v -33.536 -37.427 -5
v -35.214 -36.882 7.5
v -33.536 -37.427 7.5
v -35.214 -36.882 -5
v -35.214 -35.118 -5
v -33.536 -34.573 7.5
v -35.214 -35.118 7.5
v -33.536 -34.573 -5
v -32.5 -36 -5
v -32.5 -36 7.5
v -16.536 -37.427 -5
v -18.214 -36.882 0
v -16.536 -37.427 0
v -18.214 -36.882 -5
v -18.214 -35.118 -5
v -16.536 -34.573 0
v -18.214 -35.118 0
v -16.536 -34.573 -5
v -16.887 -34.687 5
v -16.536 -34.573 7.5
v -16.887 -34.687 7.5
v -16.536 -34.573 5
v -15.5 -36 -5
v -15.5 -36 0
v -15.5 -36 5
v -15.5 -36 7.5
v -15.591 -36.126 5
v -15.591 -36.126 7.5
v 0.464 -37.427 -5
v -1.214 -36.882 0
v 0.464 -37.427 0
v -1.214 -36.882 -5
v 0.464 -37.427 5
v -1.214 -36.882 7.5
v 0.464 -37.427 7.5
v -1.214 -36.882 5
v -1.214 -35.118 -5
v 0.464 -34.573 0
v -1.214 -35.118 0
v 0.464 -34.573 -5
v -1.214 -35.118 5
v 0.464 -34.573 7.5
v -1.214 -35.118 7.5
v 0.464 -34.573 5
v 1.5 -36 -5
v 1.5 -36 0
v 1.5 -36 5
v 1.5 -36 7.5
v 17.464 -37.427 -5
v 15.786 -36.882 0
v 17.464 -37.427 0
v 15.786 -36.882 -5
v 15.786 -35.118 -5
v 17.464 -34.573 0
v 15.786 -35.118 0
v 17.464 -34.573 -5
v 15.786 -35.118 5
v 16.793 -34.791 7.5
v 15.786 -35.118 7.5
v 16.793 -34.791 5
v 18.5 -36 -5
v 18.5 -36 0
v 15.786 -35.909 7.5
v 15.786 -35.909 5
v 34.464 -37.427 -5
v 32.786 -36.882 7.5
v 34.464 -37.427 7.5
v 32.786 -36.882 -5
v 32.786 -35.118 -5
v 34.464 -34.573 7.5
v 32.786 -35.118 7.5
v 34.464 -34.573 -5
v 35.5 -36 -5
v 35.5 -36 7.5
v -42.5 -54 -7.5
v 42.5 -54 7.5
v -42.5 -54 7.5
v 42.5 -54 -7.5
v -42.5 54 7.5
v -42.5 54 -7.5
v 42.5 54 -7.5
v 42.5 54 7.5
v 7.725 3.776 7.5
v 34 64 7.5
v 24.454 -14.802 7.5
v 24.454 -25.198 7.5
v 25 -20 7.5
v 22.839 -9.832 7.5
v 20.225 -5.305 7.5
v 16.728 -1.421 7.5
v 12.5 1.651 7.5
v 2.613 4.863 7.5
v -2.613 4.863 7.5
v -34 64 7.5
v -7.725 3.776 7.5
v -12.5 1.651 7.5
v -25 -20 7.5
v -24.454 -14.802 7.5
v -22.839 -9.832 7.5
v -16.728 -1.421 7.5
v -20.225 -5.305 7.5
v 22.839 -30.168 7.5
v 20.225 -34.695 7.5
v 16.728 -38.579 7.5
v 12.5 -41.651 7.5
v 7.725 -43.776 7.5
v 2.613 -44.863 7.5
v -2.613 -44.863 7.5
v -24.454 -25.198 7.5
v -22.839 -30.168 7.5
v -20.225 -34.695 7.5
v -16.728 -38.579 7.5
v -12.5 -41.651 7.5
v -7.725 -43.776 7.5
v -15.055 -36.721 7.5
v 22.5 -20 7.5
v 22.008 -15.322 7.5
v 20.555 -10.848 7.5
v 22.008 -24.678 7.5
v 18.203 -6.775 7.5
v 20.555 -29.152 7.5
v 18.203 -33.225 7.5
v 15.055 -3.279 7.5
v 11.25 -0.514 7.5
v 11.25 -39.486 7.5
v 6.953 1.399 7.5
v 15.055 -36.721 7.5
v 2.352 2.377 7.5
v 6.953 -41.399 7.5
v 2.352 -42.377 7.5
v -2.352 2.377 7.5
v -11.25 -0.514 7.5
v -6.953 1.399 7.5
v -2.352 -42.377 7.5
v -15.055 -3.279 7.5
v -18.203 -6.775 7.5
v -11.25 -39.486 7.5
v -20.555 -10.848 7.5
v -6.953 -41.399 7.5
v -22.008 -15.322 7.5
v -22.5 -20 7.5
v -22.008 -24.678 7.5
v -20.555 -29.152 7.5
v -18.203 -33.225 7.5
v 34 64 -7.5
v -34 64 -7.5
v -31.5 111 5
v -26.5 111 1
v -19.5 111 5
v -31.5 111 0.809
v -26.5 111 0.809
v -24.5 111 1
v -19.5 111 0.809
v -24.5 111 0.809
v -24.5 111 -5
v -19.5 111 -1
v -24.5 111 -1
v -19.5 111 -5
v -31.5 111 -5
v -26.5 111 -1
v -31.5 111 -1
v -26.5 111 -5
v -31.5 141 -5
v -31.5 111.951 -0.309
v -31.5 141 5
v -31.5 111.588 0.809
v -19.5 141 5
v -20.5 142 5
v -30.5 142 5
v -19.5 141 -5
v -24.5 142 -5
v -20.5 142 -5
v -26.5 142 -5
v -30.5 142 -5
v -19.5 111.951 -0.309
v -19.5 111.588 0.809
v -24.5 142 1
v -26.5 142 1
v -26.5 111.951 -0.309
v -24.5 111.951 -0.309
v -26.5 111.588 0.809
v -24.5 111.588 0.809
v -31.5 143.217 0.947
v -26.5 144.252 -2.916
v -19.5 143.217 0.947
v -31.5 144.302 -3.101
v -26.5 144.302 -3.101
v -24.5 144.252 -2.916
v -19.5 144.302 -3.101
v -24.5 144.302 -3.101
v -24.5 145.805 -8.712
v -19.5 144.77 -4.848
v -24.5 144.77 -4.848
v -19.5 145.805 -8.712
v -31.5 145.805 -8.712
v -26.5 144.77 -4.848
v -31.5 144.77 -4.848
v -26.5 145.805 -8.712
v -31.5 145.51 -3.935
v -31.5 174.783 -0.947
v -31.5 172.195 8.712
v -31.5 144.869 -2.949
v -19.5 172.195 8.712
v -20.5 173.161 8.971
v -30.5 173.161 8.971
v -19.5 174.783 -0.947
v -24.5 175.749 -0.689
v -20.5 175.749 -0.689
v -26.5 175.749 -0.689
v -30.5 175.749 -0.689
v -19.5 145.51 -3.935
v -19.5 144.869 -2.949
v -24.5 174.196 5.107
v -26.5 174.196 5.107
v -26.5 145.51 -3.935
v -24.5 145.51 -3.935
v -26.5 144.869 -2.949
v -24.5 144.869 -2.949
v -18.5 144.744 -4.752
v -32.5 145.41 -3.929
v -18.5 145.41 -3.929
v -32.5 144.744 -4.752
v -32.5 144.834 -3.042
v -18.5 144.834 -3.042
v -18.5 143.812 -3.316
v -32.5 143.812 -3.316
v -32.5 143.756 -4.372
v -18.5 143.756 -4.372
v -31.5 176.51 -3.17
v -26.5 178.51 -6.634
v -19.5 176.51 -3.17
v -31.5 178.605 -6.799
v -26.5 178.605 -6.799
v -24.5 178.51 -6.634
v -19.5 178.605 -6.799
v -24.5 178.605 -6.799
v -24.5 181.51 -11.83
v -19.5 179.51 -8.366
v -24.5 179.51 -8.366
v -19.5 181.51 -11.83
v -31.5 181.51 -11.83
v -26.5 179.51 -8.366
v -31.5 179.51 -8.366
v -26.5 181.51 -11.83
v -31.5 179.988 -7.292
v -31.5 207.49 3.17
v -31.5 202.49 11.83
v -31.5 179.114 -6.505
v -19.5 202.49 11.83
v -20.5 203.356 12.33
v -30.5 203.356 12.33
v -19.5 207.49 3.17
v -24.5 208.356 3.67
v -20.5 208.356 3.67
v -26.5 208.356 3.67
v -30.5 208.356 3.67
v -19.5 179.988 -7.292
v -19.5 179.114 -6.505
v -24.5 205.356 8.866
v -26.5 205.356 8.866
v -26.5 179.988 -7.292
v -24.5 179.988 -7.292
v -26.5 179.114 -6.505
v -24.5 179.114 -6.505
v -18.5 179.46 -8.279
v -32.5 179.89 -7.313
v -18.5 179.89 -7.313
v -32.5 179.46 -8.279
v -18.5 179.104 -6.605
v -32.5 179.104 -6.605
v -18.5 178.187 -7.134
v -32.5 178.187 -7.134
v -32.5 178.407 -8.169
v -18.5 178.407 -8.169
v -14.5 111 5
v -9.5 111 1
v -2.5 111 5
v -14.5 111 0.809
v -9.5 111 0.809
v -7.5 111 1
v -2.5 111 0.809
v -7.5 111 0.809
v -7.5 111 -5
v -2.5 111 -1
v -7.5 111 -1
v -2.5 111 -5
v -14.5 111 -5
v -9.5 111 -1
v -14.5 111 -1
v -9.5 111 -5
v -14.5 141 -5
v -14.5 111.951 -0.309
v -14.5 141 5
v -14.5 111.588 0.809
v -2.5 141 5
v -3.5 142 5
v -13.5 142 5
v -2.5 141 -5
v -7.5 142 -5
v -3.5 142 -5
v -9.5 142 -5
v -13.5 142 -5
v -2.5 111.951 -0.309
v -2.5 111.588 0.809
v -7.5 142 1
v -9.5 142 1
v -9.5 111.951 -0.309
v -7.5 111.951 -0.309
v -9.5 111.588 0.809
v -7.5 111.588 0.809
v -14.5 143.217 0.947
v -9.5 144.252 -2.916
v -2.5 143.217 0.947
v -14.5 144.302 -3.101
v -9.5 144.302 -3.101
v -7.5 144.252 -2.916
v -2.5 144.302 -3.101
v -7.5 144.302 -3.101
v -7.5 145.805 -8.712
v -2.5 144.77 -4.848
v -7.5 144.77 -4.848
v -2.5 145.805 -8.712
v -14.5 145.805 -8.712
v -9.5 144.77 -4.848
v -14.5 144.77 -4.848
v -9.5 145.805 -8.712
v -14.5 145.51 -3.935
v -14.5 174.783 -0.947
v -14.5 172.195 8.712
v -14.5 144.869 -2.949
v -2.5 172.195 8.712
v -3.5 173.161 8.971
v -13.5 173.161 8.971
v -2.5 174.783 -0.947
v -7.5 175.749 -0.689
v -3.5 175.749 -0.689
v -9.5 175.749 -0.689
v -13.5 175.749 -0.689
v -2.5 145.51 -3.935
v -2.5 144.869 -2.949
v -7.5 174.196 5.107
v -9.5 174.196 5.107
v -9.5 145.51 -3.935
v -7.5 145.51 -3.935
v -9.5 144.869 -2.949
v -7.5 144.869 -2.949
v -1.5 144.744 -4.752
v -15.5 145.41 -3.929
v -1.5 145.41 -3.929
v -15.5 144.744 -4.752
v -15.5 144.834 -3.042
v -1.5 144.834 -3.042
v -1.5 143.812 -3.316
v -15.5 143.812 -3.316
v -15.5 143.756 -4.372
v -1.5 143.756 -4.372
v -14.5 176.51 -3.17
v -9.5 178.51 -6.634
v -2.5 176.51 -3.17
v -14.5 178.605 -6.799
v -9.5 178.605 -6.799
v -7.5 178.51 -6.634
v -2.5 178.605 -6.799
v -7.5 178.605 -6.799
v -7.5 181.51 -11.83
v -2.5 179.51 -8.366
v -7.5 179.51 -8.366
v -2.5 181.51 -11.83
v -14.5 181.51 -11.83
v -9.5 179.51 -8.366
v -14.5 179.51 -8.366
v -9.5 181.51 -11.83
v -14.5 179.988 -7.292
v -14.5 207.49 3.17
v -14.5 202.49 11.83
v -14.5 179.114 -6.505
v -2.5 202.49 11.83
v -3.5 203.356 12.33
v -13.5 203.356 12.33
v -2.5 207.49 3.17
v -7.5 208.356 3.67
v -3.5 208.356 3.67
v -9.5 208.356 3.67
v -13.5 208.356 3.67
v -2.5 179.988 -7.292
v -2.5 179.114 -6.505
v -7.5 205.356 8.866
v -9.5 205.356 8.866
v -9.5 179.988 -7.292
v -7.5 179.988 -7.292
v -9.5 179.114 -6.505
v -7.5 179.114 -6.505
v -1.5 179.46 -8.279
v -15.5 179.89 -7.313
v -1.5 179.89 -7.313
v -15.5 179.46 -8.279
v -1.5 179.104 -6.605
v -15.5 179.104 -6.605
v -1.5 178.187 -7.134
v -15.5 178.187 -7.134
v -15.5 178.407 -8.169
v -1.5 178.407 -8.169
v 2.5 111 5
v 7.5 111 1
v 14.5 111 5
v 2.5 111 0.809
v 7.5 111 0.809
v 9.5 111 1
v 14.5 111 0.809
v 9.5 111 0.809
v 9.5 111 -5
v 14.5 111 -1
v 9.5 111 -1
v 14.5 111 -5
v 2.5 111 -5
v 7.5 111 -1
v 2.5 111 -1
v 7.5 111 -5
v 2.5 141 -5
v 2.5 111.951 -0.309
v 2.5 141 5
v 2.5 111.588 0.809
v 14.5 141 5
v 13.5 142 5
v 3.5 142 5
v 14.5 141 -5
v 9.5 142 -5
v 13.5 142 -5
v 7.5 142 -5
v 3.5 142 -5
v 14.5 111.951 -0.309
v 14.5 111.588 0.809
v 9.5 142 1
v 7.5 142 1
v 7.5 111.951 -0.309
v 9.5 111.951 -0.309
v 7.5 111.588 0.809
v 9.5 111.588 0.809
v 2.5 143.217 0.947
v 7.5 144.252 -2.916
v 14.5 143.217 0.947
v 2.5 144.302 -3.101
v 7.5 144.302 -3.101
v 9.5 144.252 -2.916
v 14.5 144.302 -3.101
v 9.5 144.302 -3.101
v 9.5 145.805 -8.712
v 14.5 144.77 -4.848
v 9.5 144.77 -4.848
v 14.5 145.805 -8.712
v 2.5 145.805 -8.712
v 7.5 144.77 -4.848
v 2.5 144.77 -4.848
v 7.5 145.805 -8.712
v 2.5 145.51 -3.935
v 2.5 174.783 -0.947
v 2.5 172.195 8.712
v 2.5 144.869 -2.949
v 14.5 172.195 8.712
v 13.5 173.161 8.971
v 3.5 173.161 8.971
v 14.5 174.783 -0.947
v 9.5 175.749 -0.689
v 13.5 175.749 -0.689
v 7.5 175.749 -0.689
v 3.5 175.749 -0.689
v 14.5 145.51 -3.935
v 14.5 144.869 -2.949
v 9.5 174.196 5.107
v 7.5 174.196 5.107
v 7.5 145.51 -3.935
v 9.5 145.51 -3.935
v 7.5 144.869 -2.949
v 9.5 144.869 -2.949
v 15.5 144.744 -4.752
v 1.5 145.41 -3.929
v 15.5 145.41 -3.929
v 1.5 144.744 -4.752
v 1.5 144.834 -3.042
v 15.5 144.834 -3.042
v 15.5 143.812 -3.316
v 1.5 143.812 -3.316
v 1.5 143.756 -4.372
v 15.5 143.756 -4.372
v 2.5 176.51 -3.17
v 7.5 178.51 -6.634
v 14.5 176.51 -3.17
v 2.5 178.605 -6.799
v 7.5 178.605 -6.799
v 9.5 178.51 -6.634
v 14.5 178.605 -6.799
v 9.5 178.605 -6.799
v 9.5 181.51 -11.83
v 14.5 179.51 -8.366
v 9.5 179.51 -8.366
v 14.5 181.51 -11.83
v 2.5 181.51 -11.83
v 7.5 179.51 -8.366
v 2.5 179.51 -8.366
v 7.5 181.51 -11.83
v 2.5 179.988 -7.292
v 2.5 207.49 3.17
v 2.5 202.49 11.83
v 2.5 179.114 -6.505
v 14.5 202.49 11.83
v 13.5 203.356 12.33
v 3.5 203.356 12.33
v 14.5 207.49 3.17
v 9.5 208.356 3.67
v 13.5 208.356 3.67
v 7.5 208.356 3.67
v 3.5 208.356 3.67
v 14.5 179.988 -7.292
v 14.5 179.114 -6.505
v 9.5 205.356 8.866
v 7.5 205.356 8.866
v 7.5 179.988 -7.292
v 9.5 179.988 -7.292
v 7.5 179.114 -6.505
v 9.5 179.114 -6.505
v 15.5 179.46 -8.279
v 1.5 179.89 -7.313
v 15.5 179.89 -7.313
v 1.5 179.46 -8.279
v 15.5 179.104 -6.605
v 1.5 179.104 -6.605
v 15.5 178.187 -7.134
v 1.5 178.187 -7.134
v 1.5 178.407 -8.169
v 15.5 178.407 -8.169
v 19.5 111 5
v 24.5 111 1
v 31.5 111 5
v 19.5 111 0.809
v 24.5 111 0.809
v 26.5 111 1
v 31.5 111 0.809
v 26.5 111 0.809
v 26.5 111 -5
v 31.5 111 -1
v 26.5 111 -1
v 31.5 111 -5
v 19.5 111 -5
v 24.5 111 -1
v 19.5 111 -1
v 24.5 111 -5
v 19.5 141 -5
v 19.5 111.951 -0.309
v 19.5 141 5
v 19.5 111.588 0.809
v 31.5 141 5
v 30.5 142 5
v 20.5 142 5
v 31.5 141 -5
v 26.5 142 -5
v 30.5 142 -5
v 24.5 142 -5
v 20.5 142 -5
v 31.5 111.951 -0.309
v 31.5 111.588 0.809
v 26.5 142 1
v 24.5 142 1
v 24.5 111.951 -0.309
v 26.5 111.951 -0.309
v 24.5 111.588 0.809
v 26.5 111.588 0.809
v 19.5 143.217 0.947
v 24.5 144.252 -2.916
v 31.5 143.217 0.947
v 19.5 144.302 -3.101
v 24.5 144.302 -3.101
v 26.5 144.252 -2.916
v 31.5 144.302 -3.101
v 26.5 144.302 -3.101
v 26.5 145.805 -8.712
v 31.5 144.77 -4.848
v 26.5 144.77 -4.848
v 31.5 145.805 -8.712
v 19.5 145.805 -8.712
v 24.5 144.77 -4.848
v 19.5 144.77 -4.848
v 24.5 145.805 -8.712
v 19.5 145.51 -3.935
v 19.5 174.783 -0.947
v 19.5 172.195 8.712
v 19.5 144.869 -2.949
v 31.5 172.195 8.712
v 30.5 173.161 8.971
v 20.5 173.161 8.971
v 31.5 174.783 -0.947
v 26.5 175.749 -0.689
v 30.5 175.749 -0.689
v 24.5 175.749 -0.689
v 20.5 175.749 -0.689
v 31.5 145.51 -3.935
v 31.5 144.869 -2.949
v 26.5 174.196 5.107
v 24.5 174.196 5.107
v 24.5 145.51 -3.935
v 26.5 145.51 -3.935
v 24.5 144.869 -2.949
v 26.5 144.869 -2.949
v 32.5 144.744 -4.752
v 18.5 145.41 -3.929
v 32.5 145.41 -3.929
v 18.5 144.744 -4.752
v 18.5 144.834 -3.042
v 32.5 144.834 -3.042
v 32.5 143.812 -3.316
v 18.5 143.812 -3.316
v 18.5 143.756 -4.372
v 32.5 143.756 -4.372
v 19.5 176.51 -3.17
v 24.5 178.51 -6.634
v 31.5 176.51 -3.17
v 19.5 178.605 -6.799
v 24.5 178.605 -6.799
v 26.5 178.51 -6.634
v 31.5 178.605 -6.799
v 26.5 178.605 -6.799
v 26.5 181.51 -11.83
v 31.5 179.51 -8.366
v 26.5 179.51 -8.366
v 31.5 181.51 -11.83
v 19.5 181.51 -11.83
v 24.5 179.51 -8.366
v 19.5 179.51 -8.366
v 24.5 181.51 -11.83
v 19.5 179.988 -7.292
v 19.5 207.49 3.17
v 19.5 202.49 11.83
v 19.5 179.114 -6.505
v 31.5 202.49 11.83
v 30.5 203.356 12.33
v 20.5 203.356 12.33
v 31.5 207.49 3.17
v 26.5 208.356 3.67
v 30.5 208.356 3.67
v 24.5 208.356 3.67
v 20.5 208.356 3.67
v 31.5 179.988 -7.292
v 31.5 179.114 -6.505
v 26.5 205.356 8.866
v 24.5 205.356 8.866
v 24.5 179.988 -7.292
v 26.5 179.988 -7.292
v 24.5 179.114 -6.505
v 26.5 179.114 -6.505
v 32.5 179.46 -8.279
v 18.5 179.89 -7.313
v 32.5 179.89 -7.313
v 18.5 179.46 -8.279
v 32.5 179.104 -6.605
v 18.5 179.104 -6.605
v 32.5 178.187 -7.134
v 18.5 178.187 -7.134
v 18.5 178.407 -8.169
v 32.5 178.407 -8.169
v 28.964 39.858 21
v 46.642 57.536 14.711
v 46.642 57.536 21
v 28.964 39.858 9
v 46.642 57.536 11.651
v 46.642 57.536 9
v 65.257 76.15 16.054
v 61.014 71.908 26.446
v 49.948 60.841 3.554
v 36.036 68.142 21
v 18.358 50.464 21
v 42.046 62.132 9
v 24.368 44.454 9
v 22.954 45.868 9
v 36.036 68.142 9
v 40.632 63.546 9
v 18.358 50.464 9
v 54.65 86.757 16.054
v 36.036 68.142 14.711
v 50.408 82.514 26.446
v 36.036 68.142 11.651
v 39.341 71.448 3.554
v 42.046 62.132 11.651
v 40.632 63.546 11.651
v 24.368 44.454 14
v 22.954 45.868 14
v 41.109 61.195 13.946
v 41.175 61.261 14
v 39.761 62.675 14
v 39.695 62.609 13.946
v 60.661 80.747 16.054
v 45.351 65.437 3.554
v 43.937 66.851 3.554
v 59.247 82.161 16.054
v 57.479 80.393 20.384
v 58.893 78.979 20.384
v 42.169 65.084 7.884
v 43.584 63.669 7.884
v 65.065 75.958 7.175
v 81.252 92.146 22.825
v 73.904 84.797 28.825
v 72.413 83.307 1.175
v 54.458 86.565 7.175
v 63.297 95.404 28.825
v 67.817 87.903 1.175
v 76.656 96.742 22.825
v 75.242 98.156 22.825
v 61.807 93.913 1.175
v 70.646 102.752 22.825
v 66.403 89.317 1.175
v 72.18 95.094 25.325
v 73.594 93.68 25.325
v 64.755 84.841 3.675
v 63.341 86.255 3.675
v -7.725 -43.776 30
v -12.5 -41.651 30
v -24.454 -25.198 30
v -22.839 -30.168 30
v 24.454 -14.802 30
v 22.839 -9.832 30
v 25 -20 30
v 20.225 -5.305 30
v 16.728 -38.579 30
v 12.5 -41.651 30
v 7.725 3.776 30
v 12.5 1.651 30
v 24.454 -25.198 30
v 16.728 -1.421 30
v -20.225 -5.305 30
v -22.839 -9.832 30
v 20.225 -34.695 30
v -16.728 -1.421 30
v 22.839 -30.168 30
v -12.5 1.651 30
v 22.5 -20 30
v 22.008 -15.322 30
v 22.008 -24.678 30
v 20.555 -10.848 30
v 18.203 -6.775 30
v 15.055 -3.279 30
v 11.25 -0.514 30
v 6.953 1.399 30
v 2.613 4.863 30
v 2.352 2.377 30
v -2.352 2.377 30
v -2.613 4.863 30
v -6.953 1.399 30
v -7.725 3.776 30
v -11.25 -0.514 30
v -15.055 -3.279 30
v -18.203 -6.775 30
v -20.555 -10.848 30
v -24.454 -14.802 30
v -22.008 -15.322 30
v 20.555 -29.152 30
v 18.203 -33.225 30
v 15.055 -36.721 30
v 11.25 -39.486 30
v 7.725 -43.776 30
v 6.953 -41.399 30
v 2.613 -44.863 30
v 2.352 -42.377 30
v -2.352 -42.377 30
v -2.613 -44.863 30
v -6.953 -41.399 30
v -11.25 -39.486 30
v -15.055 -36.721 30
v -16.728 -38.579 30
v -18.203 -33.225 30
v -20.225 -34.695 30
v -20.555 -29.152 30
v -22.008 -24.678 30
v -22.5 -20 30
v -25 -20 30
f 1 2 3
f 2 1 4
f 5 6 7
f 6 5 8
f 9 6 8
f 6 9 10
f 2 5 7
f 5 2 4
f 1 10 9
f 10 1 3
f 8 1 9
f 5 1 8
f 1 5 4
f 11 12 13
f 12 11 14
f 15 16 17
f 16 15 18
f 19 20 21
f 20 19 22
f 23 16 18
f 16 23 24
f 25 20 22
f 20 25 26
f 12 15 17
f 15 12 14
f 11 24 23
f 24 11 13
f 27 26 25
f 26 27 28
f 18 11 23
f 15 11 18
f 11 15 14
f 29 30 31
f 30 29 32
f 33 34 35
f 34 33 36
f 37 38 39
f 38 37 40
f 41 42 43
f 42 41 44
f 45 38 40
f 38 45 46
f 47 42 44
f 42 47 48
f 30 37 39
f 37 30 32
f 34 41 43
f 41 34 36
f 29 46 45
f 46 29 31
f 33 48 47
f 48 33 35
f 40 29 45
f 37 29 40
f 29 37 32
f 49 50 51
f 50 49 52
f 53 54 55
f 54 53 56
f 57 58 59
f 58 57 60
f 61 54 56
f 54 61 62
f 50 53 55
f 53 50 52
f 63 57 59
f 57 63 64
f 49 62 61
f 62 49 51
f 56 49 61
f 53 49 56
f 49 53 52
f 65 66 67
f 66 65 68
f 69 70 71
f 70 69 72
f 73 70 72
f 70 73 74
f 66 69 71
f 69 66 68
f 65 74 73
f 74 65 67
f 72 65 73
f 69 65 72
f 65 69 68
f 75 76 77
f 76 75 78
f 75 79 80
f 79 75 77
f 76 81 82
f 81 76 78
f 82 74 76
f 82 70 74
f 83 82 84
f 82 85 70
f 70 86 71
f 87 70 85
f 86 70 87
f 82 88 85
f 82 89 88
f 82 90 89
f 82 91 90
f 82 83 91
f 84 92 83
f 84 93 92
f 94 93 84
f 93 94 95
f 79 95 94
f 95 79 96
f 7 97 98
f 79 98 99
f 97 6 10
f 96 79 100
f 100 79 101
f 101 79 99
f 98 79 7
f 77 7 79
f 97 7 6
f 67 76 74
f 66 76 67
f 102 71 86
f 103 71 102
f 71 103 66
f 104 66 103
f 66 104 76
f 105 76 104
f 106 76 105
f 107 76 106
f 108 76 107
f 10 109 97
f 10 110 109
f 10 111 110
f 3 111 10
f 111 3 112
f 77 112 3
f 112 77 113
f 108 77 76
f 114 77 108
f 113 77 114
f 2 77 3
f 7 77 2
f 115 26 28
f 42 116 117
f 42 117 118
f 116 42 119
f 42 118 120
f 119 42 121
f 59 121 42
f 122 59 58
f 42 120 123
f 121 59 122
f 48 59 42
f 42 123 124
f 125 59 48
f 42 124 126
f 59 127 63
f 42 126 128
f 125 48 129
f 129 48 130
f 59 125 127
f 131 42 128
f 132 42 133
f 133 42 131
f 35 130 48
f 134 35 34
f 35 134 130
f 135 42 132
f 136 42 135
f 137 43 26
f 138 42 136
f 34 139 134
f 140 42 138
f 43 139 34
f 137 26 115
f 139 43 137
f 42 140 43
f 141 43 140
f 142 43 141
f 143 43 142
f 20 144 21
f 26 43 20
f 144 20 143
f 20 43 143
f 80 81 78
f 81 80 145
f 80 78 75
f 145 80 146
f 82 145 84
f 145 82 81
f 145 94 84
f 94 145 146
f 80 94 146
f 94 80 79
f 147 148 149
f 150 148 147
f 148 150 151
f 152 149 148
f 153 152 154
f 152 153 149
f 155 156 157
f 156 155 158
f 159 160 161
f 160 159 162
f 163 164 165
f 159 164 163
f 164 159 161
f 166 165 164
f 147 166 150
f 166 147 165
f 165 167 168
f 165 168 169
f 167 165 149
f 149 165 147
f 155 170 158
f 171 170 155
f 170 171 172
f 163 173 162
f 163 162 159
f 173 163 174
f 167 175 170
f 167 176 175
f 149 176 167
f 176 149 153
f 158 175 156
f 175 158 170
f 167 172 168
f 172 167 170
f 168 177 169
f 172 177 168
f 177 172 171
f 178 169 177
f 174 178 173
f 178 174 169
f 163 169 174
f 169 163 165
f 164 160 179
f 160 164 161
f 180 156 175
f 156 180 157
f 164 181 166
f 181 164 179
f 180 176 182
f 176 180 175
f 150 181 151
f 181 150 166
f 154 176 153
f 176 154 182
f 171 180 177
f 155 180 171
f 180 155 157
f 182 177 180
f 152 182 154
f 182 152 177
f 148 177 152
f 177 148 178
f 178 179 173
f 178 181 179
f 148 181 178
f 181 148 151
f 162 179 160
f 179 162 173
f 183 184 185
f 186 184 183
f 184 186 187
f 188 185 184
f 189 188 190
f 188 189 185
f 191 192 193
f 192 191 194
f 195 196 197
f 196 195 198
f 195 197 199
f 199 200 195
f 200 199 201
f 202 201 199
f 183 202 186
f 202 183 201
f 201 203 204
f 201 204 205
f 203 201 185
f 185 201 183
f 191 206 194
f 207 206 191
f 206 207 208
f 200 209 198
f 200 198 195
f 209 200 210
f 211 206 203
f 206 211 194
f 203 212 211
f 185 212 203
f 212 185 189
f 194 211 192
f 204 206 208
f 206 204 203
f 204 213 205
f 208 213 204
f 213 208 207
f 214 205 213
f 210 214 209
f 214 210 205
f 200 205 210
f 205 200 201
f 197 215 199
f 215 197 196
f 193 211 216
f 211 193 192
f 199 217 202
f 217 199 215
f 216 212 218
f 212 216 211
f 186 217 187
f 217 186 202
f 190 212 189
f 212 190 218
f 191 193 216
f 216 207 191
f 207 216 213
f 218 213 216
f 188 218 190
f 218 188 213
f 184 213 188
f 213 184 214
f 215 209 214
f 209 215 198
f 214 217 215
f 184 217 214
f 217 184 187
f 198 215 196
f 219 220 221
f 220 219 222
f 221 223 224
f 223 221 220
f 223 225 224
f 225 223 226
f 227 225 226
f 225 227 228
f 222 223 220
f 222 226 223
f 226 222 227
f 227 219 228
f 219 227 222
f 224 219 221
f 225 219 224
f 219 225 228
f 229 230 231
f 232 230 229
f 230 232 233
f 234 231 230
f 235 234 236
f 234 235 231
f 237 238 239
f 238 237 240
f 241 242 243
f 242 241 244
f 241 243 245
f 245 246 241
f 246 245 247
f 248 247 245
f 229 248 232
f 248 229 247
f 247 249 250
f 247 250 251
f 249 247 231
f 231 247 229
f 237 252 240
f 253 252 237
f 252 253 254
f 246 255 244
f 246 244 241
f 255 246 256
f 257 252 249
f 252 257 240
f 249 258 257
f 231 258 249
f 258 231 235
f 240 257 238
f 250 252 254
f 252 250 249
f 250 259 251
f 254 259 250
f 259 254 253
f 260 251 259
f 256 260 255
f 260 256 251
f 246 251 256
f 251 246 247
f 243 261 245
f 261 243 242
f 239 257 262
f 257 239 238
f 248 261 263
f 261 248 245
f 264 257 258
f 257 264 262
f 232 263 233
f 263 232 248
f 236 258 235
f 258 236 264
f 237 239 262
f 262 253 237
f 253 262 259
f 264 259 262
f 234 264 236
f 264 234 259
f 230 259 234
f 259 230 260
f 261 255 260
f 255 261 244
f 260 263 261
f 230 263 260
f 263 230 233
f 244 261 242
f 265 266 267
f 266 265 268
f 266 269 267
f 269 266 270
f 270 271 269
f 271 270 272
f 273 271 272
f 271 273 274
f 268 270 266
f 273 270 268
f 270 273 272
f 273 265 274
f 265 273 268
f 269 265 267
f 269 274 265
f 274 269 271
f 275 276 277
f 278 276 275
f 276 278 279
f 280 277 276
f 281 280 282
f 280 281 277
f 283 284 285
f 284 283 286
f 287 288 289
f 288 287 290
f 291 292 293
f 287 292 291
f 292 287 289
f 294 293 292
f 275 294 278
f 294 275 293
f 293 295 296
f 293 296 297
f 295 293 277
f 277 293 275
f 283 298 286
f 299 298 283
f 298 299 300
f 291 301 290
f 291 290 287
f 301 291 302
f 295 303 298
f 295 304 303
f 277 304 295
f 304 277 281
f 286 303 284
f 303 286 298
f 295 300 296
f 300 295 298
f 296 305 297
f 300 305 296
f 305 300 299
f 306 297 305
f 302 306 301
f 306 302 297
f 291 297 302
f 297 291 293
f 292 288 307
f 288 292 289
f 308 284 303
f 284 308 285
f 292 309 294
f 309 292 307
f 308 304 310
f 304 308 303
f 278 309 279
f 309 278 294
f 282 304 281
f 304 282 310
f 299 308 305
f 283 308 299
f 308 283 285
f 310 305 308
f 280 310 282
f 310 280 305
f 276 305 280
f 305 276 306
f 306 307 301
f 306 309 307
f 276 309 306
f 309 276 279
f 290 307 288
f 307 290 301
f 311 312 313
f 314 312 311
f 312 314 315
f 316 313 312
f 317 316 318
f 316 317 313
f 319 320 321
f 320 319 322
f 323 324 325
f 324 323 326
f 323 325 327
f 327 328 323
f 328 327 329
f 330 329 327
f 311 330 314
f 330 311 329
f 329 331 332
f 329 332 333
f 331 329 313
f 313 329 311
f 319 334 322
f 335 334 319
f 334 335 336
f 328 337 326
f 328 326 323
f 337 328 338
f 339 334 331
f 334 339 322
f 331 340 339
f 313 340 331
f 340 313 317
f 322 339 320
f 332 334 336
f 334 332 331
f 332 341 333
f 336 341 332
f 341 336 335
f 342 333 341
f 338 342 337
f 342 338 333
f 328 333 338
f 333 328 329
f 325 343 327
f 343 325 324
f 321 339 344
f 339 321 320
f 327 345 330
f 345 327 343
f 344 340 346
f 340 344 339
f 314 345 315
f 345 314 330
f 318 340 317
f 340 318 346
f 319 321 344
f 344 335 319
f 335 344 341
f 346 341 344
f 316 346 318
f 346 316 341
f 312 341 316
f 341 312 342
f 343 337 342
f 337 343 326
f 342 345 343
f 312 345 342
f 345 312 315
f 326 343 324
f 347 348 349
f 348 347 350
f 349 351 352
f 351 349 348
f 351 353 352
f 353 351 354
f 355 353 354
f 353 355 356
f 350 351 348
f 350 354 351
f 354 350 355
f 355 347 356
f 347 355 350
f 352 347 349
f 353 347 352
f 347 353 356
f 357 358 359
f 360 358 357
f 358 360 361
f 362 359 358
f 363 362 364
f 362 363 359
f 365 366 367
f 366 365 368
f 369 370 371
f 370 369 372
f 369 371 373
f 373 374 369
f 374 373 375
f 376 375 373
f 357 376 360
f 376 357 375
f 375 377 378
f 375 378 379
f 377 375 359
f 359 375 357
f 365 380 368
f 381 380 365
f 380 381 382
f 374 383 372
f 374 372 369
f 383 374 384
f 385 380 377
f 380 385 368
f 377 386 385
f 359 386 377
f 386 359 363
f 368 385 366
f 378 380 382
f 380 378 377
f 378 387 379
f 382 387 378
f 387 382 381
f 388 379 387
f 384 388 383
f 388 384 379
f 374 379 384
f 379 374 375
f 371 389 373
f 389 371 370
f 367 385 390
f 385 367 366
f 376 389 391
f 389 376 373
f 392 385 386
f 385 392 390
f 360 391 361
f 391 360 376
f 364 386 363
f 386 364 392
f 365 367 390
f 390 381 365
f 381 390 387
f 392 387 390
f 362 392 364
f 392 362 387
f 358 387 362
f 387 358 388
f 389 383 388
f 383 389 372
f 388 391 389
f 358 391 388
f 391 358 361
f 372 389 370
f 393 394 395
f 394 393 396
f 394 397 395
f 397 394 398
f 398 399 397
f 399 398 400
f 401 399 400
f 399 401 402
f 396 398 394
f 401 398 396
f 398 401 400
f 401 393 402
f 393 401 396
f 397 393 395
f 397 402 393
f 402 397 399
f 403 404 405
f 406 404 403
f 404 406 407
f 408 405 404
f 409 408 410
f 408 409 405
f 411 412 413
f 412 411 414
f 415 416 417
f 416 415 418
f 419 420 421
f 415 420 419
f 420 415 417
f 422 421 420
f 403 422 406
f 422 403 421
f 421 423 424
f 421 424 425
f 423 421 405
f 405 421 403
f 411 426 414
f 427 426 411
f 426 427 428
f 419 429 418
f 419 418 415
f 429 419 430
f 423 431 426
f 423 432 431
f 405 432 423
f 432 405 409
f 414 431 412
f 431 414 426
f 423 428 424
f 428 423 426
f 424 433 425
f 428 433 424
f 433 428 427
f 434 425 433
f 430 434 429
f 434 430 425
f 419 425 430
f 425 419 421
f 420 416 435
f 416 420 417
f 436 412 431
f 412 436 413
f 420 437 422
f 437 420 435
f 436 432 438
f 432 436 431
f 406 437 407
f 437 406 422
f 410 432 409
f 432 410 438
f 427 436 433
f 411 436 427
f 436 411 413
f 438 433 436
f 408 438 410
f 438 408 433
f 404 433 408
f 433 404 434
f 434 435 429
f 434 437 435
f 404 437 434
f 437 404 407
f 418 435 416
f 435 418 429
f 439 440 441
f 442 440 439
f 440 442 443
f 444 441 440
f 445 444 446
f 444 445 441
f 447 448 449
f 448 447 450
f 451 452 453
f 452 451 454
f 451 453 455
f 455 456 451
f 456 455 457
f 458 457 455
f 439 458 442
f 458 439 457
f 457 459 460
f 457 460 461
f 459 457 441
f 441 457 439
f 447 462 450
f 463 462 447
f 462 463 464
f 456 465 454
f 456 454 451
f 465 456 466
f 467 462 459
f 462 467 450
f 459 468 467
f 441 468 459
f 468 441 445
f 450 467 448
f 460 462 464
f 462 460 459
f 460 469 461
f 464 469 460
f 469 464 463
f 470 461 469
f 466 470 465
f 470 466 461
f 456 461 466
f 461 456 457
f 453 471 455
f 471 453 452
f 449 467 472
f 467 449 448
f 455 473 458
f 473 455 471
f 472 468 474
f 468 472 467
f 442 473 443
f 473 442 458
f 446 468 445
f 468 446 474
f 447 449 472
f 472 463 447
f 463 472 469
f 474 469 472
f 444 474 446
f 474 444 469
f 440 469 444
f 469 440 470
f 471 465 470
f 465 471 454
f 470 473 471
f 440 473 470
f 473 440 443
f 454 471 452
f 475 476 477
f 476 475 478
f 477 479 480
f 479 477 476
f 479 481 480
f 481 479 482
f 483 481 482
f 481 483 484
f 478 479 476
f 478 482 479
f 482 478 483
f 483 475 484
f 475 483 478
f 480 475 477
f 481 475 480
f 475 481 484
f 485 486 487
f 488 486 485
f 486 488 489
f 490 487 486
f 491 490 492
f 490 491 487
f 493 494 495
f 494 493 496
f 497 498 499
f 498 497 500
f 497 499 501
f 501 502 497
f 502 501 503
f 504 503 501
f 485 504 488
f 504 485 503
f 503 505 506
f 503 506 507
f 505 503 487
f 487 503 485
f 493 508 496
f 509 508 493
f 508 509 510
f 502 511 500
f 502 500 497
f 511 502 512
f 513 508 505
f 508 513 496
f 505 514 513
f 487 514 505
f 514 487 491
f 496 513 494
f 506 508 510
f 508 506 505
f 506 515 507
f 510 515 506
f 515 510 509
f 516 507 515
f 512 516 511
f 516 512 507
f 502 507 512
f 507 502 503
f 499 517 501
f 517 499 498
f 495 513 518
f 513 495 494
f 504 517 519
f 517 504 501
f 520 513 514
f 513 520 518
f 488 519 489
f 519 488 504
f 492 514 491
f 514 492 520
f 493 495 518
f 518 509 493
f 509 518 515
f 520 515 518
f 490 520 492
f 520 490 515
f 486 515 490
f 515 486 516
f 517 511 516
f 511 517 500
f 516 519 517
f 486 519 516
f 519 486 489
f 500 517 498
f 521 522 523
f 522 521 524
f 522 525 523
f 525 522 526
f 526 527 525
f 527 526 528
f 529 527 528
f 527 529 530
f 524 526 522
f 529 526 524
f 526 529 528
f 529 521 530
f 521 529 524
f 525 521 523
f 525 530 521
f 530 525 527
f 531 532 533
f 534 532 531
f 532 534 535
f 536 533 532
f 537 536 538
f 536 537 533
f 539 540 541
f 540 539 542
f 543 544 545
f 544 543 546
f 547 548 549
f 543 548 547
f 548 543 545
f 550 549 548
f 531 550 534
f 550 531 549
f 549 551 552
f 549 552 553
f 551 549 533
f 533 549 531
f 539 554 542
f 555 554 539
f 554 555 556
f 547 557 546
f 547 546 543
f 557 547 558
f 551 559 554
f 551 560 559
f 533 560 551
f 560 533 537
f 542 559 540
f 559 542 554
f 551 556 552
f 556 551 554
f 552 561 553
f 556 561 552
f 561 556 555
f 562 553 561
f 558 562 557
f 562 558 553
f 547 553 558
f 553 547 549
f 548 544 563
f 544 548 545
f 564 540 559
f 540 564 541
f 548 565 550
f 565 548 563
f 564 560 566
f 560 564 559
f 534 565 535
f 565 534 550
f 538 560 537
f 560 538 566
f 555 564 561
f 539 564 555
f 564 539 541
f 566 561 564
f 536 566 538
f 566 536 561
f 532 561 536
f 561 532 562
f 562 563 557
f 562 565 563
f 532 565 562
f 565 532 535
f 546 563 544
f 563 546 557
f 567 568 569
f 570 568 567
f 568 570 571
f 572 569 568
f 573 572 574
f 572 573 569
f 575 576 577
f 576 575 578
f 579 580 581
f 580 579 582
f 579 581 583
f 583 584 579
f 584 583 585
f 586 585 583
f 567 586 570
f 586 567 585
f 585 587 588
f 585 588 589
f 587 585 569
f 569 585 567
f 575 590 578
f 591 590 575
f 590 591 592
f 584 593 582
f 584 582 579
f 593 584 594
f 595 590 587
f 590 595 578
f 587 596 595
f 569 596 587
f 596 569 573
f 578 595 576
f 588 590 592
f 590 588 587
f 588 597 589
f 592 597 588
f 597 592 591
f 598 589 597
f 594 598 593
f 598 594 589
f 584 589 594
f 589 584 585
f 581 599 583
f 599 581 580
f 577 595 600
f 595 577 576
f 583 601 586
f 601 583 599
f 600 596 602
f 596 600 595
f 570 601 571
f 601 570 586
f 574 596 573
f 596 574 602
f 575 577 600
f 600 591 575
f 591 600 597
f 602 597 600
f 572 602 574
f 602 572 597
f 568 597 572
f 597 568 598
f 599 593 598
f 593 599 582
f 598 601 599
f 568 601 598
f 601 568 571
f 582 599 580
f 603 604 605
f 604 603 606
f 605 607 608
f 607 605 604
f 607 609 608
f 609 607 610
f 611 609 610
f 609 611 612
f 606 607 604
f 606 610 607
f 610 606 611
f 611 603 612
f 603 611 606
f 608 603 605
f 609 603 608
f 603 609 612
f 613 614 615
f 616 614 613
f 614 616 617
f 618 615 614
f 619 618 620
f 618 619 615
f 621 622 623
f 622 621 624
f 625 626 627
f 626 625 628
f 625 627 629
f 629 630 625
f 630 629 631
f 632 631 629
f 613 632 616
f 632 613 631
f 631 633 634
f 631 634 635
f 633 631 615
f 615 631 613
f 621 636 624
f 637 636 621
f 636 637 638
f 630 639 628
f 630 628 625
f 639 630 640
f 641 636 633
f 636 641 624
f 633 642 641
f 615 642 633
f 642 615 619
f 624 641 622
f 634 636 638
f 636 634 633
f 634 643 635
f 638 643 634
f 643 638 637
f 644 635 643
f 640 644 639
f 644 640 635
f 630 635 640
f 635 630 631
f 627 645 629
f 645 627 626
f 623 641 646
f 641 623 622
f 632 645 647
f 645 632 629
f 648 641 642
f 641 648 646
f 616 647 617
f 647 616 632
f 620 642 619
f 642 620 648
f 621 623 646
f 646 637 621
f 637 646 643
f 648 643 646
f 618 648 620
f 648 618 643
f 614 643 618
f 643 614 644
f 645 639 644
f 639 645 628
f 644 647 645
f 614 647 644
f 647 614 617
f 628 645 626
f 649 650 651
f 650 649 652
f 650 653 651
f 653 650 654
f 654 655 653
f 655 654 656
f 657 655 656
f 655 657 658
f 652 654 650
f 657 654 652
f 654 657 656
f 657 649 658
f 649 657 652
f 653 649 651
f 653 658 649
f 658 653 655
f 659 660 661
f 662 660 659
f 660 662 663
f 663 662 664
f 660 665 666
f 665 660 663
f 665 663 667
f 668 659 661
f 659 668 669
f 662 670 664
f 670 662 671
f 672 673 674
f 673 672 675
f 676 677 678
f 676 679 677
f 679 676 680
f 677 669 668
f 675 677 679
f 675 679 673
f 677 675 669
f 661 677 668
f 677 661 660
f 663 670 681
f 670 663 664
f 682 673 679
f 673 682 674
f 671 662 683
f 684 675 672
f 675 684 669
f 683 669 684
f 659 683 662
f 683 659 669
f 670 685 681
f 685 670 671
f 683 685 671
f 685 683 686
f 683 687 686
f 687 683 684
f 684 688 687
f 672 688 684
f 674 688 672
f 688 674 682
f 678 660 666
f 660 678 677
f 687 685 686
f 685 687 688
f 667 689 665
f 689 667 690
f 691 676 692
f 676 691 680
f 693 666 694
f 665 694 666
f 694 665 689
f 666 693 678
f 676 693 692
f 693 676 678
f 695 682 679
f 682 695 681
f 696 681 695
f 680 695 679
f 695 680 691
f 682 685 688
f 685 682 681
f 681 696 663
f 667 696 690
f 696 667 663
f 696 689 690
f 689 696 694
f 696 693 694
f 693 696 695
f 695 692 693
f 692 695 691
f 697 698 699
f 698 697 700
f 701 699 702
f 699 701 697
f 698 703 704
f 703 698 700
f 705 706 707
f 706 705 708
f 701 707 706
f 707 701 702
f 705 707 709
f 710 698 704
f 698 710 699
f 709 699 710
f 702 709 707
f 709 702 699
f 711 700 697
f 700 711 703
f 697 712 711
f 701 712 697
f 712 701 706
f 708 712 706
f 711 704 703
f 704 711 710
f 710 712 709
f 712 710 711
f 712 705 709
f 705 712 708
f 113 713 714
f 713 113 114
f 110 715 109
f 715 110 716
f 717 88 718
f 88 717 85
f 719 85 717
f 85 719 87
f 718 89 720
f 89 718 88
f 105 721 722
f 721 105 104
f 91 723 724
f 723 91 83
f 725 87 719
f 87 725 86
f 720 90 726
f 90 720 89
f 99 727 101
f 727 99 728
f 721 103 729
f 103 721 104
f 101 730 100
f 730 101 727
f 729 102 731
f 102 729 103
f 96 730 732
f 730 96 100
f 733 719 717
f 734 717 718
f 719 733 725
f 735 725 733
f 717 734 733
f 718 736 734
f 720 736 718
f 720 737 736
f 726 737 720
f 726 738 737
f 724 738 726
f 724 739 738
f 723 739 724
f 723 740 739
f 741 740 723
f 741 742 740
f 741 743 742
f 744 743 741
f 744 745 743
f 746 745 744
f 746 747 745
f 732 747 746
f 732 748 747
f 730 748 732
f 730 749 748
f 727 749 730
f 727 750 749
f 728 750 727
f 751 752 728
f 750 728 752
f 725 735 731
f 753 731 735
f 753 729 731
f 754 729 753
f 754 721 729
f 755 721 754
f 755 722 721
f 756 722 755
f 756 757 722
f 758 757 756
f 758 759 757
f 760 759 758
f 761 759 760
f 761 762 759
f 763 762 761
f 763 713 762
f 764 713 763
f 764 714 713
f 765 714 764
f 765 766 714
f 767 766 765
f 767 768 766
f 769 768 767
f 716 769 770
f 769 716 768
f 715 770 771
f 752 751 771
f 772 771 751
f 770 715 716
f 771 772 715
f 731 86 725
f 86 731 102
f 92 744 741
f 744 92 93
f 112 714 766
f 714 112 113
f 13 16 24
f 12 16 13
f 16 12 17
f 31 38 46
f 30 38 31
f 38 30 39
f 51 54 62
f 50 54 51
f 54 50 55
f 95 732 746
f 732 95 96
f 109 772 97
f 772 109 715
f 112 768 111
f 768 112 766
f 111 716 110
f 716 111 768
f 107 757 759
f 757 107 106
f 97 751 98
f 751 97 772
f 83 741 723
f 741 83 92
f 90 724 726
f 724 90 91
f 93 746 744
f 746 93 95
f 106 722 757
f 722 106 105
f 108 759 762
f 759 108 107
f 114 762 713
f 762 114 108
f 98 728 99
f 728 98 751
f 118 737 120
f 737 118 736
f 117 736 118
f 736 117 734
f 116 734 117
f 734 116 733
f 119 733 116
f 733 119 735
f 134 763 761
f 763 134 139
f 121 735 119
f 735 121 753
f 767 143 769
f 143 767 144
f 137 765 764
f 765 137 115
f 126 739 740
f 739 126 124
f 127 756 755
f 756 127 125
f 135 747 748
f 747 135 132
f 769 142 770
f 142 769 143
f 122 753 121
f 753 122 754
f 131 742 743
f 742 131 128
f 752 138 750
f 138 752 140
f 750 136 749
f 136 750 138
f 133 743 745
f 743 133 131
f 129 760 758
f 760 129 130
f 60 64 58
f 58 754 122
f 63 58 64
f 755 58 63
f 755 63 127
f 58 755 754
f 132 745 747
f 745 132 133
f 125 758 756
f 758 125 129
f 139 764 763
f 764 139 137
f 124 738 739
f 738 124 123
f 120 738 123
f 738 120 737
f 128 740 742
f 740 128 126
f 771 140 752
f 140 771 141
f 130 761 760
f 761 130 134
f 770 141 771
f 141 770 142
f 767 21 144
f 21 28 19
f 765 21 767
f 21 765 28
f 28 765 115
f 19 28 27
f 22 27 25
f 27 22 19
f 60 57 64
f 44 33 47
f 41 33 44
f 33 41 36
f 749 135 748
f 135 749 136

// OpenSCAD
/*
 * ================================================================
 * PARAMETRIC PROSTHETIC HAND
 * Functional prosthetic with tendon-driven fingers
 * ================================================================
 */

/* ----------------------------- USER PARAMETERS ----------------------------- */

// Hand Dimensions
hand_length = 180;         // Total hand length (mm)
palm_width = 85;           // Palm width (mm)
finger_count = 5;          // Number of fingers
thumb_included = true;     // Include opposable thumb

// Finger Configuration
finger_segments = 3;       // Segments per finger
segment_length = 30;       // Average segment length (mm)
joint_flexibility = 45;    // Joint bend angle (degrees)

// Mechanical System
actuation_type = "tendon";  // "tendon", "servo", "hybrid"
grip_strength = 15;         // Target grip strength (N)
wrist_attachment = "socket"; // "socket", "clamp", "custom"

/* ----------------------------- MAIN GEOMETRY ----------------------------- */

module prosthetic_hand() {
    // Palm assembly
    palm_base();
    
    // Fingers
    for (i = [0:finger_count-2]) {
        translate([palm_width/finger_count * (i - (finger_count-2)/2), hand_length * 0.7, 0])
            finger_assembly(i);
    }
    
    // Thumb
    if (thumb_included) {
        translate([palm_width/2 - 10, hand_length * 0.3, 15])
            rotate([0, 0, -45])
                thumb_assembly();
    }
    
    // Wrist connection
    translate([0, -20, 0])
        wrist_connector();
}

module palm_base() {
    difference() {
        hull() {
            translate([0, 0, 0])
                cube([palm_width, hand_length * 0.6, 15], center=true);
            translate([0, hand_length * 0.3, 0])
                cube([palm_width * 0.8, 20, 15], center=true);
        }
        
        // Tendon channels
        for (i = [0:finger_count-1]) {
            translate([palm_width/finger_count * (i - (finger_count-1)/2), -hand_length * 0.2, -5])
                cylinder(d=3, h=20);
        }
    }
}

module finger_assembly(finger_id) {
    for (segment = [0:finger_segments-1]) {
        translate([0, segment * segment_length * 1.1, 0])
            rotate([segment * joint_flexibility/finger_segments, 0, 0])
                finger_segment(segment);
    }
}

module finger_segment(segment_id) {
    difference() {
        // Main segment
        hull() {
            cube([12, segment_length, 10], center=true);
            translate([0, segment_length/2, 0])
                cube([10, 2, 10], center=true);
        }
        
        // Joint hole
        translate([0, -segment_length/2, 0])
            rotate([0, 90, 0])
                cylinder(d=2, h=15, center=true);
        
        // Tendon channel
        translate([0, 0, -3])
            cube([2, segment_length + 2, 8], center=true);
    }
    
    // Joint pin
    if (segment_id > 0) {
        translate([0, -segment_length/2, 0])
            rotate([0, 90, 0])
                cylinder(d=1.8, h=14, center=true);
    }
}

module thumb_assembly() {
    for (segment = [0:2]) {
        translate([0, segment * 25, 0])
            rotate([segment * 30, 0, 0])
                thumb_segment();
    }
}

module thumb_segment() {
    difference() {
        cube([15, 25, 12], center=true);
        
        // Tendon channel
        translate([0, 0, -4])
            cube([2, 27, 6], center=true);
    }
}

module wrist_connector() {
    if (wrist_attachment == "socket") {
        difference() {
            cylinder(d=50, h=30);
            translate([0, 0, 5])
                cylinder(d=45, h=30);
        }
    }
}

prosthetic_hand();
